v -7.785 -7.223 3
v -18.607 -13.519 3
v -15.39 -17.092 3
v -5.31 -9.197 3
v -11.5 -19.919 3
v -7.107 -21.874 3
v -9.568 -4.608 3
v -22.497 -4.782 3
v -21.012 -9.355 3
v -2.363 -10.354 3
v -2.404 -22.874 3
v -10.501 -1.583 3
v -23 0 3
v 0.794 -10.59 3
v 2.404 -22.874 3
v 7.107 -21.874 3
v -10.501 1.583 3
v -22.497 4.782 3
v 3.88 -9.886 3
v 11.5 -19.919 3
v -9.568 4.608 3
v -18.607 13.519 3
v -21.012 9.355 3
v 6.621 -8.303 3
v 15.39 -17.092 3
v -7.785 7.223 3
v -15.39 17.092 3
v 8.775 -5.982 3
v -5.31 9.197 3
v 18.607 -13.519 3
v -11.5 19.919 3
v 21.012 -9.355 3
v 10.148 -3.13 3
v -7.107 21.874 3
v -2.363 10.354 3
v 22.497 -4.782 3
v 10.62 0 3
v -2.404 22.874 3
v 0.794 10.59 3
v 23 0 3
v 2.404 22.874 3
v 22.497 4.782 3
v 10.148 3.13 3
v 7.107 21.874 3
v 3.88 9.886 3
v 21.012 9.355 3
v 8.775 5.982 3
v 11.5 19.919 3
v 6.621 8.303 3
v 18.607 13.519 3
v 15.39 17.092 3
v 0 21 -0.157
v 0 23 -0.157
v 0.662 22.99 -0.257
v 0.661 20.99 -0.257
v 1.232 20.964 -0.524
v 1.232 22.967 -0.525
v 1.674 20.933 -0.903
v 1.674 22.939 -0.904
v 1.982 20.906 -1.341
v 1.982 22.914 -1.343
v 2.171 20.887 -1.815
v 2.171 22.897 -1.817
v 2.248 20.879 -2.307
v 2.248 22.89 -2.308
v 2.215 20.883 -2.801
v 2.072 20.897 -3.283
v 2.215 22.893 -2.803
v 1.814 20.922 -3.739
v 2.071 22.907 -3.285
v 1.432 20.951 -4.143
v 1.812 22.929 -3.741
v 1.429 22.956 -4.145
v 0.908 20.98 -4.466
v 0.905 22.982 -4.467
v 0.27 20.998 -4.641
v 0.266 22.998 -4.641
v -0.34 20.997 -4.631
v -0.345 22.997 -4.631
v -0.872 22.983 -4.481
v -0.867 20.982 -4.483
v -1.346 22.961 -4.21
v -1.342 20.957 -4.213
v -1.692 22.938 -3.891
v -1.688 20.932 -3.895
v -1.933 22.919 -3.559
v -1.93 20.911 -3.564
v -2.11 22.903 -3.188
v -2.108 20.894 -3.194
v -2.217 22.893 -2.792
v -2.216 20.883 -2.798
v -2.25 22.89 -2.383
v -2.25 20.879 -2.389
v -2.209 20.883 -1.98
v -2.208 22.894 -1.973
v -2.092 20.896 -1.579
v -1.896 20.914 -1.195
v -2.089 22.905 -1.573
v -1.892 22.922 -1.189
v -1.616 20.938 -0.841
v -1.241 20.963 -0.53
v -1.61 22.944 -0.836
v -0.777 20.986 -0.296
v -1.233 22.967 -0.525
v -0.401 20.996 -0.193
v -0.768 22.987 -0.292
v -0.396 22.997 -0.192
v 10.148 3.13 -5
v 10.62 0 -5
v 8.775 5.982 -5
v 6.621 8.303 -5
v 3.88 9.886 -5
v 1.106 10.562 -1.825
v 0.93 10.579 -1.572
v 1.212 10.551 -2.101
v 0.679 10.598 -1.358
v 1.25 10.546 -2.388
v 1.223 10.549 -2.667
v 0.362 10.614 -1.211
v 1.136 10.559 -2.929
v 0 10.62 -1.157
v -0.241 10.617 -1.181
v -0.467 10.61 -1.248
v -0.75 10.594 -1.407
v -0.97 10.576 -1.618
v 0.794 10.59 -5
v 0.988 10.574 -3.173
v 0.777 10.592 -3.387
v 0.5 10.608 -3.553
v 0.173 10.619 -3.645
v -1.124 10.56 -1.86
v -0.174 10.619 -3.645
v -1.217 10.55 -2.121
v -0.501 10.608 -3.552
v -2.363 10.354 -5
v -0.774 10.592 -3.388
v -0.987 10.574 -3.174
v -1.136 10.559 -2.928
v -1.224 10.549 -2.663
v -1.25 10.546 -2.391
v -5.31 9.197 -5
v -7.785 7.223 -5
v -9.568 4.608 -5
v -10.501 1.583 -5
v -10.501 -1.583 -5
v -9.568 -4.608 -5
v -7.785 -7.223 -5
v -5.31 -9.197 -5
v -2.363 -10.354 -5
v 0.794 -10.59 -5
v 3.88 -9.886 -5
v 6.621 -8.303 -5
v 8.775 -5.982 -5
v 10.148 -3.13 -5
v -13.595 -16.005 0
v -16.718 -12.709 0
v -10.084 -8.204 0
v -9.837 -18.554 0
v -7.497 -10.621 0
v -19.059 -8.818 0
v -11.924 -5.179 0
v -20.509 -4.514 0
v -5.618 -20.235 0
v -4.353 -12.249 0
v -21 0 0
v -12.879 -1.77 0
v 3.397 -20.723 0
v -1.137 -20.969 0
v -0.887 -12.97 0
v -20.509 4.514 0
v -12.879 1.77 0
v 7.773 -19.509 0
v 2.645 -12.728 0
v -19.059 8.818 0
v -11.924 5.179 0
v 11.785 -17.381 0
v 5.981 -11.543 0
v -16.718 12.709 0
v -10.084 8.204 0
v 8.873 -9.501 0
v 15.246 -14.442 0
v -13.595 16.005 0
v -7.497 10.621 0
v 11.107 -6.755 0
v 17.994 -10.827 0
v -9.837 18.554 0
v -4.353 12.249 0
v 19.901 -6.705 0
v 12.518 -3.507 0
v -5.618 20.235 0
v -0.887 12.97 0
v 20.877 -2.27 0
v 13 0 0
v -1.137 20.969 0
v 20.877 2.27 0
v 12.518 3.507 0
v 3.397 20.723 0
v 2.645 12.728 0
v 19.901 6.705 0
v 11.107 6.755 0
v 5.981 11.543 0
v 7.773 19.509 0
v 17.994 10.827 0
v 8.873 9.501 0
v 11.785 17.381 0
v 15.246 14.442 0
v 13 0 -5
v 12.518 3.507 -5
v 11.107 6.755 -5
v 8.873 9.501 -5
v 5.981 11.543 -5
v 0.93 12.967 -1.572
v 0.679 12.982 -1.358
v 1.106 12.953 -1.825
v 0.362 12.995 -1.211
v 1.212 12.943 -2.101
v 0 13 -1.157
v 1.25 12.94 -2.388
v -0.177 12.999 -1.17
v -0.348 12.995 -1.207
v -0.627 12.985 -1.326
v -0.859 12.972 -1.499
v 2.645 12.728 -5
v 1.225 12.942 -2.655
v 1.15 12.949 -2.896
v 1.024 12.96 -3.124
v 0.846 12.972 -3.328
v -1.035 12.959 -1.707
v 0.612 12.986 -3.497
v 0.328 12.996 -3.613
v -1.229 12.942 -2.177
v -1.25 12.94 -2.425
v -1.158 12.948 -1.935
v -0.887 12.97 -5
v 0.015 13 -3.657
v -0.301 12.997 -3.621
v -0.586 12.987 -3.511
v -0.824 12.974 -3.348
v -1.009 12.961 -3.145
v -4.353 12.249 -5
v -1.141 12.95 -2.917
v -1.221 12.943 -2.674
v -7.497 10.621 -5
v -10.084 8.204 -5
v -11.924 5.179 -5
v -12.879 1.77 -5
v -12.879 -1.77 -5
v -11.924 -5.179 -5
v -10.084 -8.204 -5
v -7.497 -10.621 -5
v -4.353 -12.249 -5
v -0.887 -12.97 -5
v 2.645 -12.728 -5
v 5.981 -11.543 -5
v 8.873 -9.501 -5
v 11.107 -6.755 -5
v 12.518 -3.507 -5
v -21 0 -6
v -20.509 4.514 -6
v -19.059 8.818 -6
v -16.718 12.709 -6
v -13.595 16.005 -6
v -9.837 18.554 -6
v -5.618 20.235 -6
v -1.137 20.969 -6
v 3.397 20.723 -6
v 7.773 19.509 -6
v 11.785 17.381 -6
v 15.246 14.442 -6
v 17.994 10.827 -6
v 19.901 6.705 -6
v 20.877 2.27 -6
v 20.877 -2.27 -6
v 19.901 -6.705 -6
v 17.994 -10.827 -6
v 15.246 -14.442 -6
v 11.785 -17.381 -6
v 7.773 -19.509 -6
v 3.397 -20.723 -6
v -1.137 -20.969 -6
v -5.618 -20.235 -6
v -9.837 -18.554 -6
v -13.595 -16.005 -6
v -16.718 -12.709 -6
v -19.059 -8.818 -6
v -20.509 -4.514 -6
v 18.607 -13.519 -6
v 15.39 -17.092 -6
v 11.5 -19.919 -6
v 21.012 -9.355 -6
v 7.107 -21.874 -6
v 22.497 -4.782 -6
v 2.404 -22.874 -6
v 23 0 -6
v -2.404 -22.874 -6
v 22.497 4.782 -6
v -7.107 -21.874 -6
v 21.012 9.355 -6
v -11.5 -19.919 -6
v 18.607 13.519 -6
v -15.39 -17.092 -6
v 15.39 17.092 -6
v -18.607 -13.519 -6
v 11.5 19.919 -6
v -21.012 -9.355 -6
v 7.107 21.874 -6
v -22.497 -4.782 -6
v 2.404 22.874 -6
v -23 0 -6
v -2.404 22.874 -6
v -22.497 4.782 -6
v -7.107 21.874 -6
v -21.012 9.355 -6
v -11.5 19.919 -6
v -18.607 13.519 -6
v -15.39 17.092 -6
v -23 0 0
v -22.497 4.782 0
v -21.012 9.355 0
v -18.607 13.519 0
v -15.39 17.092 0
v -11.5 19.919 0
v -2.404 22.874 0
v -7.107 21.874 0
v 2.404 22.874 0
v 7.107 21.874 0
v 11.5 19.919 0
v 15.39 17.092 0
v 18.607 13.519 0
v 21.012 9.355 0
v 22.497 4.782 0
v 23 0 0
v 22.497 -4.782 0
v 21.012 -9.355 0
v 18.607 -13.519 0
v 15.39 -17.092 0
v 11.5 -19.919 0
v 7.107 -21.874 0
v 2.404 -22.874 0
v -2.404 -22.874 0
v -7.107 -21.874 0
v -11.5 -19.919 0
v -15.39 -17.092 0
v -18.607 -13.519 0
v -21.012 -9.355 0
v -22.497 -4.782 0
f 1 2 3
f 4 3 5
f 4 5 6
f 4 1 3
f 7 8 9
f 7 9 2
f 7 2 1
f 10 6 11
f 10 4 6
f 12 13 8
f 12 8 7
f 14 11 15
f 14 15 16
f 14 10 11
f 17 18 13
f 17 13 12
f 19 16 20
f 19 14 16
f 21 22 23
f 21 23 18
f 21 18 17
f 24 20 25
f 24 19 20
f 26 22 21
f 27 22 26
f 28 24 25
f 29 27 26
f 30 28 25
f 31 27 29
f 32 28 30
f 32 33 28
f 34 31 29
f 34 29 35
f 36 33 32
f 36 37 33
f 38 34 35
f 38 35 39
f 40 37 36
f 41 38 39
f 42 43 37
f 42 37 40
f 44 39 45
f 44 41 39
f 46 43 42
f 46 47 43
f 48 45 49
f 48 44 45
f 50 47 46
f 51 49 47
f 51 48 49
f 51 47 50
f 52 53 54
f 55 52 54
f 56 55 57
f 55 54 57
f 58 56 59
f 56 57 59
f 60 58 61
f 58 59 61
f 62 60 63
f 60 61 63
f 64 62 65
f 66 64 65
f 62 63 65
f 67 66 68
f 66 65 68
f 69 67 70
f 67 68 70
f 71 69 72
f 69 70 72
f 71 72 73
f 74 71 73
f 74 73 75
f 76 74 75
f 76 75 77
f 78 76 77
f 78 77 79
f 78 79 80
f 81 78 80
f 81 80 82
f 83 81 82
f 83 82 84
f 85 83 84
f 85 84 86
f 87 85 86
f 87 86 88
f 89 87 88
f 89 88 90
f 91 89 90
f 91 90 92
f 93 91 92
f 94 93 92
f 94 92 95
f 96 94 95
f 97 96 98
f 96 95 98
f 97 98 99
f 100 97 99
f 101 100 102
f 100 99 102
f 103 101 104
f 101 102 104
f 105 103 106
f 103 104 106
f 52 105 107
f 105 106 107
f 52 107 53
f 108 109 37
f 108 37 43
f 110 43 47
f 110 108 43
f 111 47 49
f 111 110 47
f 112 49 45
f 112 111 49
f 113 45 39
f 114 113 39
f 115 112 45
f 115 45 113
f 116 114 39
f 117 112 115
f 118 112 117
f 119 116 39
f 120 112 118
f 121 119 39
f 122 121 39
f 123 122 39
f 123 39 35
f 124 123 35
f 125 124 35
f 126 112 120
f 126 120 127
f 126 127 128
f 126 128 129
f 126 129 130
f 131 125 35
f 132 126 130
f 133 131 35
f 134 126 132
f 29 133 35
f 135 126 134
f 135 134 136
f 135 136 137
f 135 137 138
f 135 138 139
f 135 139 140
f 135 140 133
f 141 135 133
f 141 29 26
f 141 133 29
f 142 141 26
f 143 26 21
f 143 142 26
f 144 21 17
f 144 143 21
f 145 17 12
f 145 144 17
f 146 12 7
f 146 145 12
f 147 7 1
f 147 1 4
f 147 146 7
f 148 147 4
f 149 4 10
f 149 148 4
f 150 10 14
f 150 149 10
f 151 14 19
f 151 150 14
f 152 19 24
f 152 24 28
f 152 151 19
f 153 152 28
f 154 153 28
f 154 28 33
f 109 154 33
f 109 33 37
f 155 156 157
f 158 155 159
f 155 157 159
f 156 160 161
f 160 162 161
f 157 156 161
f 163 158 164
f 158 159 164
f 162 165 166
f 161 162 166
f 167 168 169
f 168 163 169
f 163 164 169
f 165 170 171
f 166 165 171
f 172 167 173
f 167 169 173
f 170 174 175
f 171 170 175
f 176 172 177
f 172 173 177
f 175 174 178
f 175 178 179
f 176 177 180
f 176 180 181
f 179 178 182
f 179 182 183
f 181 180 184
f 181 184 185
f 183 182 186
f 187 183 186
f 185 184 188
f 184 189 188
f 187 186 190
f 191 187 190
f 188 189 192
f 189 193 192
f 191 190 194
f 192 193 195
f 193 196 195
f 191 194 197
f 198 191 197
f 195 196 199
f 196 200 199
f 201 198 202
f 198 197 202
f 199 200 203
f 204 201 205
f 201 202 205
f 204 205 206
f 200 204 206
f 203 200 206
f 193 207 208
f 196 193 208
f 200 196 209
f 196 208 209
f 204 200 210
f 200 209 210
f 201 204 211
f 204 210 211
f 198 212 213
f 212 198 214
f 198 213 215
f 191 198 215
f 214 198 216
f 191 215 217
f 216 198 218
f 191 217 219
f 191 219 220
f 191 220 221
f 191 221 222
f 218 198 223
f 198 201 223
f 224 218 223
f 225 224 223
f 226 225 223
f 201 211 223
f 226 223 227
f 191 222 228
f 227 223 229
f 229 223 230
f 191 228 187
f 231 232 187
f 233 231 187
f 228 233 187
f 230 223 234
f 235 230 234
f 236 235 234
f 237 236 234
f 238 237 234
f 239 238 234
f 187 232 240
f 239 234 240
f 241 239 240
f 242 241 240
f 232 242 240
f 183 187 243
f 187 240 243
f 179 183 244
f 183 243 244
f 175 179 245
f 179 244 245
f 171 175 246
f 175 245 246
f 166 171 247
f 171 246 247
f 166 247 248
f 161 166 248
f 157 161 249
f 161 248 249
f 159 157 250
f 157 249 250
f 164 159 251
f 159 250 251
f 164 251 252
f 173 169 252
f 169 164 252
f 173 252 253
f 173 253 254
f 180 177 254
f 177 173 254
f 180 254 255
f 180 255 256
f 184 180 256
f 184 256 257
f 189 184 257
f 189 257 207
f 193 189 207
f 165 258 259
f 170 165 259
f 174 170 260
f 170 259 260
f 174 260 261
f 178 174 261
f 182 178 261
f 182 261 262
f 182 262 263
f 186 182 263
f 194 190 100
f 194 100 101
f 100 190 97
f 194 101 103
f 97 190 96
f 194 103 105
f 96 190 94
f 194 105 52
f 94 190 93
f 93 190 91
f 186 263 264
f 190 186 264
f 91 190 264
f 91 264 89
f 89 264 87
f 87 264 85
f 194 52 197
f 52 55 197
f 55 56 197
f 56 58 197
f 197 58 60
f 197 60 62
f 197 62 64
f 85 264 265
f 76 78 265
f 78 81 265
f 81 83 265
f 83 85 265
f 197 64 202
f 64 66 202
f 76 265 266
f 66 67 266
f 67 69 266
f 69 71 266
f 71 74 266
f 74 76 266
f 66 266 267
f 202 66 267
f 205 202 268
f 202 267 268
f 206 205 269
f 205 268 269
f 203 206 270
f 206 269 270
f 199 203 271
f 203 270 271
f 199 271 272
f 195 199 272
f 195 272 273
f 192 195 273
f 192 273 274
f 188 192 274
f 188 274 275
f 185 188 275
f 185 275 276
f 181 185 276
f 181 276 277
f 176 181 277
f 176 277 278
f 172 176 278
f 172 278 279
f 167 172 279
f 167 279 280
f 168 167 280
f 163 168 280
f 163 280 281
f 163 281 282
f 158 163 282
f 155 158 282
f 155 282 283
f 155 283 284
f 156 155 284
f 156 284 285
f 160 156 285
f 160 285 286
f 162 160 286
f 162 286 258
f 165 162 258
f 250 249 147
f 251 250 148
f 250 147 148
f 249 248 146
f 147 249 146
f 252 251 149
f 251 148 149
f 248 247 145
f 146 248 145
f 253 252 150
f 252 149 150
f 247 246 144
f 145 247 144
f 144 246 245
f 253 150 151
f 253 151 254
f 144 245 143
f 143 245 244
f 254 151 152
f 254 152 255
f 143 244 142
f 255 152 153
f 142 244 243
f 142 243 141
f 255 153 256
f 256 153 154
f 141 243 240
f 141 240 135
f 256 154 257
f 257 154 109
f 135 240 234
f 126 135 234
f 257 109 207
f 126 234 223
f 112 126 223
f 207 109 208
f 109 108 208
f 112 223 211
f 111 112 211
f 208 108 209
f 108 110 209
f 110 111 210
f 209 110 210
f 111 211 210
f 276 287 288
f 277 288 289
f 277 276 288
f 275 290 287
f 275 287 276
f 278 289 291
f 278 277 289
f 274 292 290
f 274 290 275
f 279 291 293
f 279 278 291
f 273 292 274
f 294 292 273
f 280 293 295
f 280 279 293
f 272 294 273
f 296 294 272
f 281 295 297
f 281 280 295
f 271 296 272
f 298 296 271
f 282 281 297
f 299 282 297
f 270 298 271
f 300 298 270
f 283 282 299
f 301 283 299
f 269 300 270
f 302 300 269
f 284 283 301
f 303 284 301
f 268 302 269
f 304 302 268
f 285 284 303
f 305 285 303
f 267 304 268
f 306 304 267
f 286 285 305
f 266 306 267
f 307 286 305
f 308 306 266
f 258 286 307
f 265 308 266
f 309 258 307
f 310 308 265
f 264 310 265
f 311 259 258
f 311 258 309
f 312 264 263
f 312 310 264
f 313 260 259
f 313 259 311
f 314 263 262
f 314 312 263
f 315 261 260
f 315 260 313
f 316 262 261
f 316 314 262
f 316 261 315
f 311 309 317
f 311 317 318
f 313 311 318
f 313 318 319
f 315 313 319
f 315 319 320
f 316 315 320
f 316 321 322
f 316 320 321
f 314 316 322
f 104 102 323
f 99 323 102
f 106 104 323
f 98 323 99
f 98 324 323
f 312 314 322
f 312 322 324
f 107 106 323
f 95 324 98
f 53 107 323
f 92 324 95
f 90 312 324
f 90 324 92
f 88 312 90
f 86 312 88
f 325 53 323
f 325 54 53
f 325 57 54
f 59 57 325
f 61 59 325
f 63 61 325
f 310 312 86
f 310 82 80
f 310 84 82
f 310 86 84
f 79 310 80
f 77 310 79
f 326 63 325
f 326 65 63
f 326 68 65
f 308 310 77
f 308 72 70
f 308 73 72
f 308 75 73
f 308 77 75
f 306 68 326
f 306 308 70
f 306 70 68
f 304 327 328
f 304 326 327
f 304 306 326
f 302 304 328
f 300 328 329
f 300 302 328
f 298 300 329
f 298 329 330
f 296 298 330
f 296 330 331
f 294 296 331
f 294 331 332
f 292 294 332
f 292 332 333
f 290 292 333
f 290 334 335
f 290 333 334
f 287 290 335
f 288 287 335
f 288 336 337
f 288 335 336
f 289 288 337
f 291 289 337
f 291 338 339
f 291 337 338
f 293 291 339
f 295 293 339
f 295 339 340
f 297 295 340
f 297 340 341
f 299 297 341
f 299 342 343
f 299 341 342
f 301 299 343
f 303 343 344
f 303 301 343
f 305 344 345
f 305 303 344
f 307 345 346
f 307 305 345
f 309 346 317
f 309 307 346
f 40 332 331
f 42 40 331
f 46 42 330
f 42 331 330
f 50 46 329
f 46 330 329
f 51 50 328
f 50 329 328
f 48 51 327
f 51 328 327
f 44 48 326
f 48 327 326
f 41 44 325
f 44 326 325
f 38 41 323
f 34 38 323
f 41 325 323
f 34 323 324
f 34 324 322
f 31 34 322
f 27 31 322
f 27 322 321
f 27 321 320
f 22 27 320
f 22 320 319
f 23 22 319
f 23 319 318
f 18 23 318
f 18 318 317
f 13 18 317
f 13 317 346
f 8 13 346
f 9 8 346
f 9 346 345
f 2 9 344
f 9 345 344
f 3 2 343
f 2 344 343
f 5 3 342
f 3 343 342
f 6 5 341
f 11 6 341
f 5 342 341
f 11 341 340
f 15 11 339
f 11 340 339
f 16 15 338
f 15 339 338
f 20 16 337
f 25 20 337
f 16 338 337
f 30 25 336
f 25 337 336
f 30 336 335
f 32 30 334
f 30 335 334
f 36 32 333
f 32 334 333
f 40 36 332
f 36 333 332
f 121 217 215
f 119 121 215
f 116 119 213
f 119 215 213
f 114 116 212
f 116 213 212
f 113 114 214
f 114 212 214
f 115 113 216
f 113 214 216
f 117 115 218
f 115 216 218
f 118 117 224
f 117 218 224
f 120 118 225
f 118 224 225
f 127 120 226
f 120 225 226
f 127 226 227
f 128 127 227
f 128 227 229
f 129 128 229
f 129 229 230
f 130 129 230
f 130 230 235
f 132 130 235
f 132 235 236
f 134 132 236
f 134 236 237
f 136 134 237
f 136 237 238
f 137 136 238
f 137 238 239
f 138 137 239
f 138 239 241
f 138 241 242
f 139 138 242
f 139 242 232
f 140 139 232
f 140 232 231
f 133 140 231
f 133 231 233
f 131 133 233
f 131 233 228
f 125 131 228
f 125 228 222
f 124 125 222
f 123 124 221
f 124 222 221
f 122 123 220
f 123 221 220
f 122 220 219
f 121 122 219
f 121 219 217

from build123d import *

# Parameters (mm, degrees)
SKETCH1_R           = 23
SKETCH1_R_2         = 10.62
BOSS_EXTRUDE1_DEPTH = 3
BOSS_EXTRUDE3_START = -8
SKETCH2_R           = 13
SKETCH2_R_2         = 10.62
BOSS_EXTRUDE3_DEPTH = 8
BOSS_EXTRUDE4_START = 6
SKETCH3_R           = 23
SKETCH3_R_2         = 21
BOSS_EXTRUDE4_DEPTH = 6
SKETCH4_R           = 1.25
CUT_EXTRUDE1_DEPTH  = 17
SKETCH4_3_R         = 2.25
CUT_EXTRUDE2_DEPTH  = 7


with BuildPart() as part:
    # Sketch1 → Boss-Extrude1 (new body)
    with BuildSketch(Plane.XY):
        Circle(SKETCH1_R)
        Circle(SKETCH1_R_2, mode=Mode.SUBTRACT)
    extrude(amount=BOSS_EXTRUDE1_DEPTH)

    # Sketch2 → Boss-Extrude3 (add)
    with BuildSketch(Plane.XY.offset(3).offset(BOSS_EXTRUDE3_START)):
        Circle(SKETCH2_R)
        Circle(SKETCH2_R_2, mode=Mode.SUBTRACT)
    extrude(amount=BOSS_EXTRUDE3_DEPTH)

    # Sketch3 → Boss-Extrude4 (add)
    with BuildSketch(Plane(origin=(0, 0, 0), x_dir=(-1, 0, 0), z_dir=(0, 0, -1)).offset(BOSS_EXTRUDE4_START)):
        Circle(SKETCH3_R)
        Circle(SKETCH3_R_2, mode=Mode.SUBTRACT)
    extrude(amount=-BOSS_EXTRUDE4_DEPTH)

    # Sketch4 → Cut-Extrude1 (cut)
    with BuildSketch(Plane(origin=(0, 24.918884167, 0), x_dir=(1, 0, 0), z_dir=(0, 1, 0))):
        with Locations((0, 2.407178774)):
            Circle(SKETCH4_R)
    extrude(amount=-CUT_EXTRUDE1_DEPTH, mode=Mode.SUBTRACT)

    # Sketch4<3> → Cut-Extrude2 (cut)
    with BuildSketch(Plane(origin=(0, 24.918884167, 0), x_dir=(1, 0, 0), z_dir=(0, 1, 0))):
        with Locations((0, 2.407178774)):
            Circle(SKETCH4_3_R)
    extrude(amount=-CUT_EXTRUDE2_DEPTH, mode=Mode.SUBTRACT)


solid = part.part
